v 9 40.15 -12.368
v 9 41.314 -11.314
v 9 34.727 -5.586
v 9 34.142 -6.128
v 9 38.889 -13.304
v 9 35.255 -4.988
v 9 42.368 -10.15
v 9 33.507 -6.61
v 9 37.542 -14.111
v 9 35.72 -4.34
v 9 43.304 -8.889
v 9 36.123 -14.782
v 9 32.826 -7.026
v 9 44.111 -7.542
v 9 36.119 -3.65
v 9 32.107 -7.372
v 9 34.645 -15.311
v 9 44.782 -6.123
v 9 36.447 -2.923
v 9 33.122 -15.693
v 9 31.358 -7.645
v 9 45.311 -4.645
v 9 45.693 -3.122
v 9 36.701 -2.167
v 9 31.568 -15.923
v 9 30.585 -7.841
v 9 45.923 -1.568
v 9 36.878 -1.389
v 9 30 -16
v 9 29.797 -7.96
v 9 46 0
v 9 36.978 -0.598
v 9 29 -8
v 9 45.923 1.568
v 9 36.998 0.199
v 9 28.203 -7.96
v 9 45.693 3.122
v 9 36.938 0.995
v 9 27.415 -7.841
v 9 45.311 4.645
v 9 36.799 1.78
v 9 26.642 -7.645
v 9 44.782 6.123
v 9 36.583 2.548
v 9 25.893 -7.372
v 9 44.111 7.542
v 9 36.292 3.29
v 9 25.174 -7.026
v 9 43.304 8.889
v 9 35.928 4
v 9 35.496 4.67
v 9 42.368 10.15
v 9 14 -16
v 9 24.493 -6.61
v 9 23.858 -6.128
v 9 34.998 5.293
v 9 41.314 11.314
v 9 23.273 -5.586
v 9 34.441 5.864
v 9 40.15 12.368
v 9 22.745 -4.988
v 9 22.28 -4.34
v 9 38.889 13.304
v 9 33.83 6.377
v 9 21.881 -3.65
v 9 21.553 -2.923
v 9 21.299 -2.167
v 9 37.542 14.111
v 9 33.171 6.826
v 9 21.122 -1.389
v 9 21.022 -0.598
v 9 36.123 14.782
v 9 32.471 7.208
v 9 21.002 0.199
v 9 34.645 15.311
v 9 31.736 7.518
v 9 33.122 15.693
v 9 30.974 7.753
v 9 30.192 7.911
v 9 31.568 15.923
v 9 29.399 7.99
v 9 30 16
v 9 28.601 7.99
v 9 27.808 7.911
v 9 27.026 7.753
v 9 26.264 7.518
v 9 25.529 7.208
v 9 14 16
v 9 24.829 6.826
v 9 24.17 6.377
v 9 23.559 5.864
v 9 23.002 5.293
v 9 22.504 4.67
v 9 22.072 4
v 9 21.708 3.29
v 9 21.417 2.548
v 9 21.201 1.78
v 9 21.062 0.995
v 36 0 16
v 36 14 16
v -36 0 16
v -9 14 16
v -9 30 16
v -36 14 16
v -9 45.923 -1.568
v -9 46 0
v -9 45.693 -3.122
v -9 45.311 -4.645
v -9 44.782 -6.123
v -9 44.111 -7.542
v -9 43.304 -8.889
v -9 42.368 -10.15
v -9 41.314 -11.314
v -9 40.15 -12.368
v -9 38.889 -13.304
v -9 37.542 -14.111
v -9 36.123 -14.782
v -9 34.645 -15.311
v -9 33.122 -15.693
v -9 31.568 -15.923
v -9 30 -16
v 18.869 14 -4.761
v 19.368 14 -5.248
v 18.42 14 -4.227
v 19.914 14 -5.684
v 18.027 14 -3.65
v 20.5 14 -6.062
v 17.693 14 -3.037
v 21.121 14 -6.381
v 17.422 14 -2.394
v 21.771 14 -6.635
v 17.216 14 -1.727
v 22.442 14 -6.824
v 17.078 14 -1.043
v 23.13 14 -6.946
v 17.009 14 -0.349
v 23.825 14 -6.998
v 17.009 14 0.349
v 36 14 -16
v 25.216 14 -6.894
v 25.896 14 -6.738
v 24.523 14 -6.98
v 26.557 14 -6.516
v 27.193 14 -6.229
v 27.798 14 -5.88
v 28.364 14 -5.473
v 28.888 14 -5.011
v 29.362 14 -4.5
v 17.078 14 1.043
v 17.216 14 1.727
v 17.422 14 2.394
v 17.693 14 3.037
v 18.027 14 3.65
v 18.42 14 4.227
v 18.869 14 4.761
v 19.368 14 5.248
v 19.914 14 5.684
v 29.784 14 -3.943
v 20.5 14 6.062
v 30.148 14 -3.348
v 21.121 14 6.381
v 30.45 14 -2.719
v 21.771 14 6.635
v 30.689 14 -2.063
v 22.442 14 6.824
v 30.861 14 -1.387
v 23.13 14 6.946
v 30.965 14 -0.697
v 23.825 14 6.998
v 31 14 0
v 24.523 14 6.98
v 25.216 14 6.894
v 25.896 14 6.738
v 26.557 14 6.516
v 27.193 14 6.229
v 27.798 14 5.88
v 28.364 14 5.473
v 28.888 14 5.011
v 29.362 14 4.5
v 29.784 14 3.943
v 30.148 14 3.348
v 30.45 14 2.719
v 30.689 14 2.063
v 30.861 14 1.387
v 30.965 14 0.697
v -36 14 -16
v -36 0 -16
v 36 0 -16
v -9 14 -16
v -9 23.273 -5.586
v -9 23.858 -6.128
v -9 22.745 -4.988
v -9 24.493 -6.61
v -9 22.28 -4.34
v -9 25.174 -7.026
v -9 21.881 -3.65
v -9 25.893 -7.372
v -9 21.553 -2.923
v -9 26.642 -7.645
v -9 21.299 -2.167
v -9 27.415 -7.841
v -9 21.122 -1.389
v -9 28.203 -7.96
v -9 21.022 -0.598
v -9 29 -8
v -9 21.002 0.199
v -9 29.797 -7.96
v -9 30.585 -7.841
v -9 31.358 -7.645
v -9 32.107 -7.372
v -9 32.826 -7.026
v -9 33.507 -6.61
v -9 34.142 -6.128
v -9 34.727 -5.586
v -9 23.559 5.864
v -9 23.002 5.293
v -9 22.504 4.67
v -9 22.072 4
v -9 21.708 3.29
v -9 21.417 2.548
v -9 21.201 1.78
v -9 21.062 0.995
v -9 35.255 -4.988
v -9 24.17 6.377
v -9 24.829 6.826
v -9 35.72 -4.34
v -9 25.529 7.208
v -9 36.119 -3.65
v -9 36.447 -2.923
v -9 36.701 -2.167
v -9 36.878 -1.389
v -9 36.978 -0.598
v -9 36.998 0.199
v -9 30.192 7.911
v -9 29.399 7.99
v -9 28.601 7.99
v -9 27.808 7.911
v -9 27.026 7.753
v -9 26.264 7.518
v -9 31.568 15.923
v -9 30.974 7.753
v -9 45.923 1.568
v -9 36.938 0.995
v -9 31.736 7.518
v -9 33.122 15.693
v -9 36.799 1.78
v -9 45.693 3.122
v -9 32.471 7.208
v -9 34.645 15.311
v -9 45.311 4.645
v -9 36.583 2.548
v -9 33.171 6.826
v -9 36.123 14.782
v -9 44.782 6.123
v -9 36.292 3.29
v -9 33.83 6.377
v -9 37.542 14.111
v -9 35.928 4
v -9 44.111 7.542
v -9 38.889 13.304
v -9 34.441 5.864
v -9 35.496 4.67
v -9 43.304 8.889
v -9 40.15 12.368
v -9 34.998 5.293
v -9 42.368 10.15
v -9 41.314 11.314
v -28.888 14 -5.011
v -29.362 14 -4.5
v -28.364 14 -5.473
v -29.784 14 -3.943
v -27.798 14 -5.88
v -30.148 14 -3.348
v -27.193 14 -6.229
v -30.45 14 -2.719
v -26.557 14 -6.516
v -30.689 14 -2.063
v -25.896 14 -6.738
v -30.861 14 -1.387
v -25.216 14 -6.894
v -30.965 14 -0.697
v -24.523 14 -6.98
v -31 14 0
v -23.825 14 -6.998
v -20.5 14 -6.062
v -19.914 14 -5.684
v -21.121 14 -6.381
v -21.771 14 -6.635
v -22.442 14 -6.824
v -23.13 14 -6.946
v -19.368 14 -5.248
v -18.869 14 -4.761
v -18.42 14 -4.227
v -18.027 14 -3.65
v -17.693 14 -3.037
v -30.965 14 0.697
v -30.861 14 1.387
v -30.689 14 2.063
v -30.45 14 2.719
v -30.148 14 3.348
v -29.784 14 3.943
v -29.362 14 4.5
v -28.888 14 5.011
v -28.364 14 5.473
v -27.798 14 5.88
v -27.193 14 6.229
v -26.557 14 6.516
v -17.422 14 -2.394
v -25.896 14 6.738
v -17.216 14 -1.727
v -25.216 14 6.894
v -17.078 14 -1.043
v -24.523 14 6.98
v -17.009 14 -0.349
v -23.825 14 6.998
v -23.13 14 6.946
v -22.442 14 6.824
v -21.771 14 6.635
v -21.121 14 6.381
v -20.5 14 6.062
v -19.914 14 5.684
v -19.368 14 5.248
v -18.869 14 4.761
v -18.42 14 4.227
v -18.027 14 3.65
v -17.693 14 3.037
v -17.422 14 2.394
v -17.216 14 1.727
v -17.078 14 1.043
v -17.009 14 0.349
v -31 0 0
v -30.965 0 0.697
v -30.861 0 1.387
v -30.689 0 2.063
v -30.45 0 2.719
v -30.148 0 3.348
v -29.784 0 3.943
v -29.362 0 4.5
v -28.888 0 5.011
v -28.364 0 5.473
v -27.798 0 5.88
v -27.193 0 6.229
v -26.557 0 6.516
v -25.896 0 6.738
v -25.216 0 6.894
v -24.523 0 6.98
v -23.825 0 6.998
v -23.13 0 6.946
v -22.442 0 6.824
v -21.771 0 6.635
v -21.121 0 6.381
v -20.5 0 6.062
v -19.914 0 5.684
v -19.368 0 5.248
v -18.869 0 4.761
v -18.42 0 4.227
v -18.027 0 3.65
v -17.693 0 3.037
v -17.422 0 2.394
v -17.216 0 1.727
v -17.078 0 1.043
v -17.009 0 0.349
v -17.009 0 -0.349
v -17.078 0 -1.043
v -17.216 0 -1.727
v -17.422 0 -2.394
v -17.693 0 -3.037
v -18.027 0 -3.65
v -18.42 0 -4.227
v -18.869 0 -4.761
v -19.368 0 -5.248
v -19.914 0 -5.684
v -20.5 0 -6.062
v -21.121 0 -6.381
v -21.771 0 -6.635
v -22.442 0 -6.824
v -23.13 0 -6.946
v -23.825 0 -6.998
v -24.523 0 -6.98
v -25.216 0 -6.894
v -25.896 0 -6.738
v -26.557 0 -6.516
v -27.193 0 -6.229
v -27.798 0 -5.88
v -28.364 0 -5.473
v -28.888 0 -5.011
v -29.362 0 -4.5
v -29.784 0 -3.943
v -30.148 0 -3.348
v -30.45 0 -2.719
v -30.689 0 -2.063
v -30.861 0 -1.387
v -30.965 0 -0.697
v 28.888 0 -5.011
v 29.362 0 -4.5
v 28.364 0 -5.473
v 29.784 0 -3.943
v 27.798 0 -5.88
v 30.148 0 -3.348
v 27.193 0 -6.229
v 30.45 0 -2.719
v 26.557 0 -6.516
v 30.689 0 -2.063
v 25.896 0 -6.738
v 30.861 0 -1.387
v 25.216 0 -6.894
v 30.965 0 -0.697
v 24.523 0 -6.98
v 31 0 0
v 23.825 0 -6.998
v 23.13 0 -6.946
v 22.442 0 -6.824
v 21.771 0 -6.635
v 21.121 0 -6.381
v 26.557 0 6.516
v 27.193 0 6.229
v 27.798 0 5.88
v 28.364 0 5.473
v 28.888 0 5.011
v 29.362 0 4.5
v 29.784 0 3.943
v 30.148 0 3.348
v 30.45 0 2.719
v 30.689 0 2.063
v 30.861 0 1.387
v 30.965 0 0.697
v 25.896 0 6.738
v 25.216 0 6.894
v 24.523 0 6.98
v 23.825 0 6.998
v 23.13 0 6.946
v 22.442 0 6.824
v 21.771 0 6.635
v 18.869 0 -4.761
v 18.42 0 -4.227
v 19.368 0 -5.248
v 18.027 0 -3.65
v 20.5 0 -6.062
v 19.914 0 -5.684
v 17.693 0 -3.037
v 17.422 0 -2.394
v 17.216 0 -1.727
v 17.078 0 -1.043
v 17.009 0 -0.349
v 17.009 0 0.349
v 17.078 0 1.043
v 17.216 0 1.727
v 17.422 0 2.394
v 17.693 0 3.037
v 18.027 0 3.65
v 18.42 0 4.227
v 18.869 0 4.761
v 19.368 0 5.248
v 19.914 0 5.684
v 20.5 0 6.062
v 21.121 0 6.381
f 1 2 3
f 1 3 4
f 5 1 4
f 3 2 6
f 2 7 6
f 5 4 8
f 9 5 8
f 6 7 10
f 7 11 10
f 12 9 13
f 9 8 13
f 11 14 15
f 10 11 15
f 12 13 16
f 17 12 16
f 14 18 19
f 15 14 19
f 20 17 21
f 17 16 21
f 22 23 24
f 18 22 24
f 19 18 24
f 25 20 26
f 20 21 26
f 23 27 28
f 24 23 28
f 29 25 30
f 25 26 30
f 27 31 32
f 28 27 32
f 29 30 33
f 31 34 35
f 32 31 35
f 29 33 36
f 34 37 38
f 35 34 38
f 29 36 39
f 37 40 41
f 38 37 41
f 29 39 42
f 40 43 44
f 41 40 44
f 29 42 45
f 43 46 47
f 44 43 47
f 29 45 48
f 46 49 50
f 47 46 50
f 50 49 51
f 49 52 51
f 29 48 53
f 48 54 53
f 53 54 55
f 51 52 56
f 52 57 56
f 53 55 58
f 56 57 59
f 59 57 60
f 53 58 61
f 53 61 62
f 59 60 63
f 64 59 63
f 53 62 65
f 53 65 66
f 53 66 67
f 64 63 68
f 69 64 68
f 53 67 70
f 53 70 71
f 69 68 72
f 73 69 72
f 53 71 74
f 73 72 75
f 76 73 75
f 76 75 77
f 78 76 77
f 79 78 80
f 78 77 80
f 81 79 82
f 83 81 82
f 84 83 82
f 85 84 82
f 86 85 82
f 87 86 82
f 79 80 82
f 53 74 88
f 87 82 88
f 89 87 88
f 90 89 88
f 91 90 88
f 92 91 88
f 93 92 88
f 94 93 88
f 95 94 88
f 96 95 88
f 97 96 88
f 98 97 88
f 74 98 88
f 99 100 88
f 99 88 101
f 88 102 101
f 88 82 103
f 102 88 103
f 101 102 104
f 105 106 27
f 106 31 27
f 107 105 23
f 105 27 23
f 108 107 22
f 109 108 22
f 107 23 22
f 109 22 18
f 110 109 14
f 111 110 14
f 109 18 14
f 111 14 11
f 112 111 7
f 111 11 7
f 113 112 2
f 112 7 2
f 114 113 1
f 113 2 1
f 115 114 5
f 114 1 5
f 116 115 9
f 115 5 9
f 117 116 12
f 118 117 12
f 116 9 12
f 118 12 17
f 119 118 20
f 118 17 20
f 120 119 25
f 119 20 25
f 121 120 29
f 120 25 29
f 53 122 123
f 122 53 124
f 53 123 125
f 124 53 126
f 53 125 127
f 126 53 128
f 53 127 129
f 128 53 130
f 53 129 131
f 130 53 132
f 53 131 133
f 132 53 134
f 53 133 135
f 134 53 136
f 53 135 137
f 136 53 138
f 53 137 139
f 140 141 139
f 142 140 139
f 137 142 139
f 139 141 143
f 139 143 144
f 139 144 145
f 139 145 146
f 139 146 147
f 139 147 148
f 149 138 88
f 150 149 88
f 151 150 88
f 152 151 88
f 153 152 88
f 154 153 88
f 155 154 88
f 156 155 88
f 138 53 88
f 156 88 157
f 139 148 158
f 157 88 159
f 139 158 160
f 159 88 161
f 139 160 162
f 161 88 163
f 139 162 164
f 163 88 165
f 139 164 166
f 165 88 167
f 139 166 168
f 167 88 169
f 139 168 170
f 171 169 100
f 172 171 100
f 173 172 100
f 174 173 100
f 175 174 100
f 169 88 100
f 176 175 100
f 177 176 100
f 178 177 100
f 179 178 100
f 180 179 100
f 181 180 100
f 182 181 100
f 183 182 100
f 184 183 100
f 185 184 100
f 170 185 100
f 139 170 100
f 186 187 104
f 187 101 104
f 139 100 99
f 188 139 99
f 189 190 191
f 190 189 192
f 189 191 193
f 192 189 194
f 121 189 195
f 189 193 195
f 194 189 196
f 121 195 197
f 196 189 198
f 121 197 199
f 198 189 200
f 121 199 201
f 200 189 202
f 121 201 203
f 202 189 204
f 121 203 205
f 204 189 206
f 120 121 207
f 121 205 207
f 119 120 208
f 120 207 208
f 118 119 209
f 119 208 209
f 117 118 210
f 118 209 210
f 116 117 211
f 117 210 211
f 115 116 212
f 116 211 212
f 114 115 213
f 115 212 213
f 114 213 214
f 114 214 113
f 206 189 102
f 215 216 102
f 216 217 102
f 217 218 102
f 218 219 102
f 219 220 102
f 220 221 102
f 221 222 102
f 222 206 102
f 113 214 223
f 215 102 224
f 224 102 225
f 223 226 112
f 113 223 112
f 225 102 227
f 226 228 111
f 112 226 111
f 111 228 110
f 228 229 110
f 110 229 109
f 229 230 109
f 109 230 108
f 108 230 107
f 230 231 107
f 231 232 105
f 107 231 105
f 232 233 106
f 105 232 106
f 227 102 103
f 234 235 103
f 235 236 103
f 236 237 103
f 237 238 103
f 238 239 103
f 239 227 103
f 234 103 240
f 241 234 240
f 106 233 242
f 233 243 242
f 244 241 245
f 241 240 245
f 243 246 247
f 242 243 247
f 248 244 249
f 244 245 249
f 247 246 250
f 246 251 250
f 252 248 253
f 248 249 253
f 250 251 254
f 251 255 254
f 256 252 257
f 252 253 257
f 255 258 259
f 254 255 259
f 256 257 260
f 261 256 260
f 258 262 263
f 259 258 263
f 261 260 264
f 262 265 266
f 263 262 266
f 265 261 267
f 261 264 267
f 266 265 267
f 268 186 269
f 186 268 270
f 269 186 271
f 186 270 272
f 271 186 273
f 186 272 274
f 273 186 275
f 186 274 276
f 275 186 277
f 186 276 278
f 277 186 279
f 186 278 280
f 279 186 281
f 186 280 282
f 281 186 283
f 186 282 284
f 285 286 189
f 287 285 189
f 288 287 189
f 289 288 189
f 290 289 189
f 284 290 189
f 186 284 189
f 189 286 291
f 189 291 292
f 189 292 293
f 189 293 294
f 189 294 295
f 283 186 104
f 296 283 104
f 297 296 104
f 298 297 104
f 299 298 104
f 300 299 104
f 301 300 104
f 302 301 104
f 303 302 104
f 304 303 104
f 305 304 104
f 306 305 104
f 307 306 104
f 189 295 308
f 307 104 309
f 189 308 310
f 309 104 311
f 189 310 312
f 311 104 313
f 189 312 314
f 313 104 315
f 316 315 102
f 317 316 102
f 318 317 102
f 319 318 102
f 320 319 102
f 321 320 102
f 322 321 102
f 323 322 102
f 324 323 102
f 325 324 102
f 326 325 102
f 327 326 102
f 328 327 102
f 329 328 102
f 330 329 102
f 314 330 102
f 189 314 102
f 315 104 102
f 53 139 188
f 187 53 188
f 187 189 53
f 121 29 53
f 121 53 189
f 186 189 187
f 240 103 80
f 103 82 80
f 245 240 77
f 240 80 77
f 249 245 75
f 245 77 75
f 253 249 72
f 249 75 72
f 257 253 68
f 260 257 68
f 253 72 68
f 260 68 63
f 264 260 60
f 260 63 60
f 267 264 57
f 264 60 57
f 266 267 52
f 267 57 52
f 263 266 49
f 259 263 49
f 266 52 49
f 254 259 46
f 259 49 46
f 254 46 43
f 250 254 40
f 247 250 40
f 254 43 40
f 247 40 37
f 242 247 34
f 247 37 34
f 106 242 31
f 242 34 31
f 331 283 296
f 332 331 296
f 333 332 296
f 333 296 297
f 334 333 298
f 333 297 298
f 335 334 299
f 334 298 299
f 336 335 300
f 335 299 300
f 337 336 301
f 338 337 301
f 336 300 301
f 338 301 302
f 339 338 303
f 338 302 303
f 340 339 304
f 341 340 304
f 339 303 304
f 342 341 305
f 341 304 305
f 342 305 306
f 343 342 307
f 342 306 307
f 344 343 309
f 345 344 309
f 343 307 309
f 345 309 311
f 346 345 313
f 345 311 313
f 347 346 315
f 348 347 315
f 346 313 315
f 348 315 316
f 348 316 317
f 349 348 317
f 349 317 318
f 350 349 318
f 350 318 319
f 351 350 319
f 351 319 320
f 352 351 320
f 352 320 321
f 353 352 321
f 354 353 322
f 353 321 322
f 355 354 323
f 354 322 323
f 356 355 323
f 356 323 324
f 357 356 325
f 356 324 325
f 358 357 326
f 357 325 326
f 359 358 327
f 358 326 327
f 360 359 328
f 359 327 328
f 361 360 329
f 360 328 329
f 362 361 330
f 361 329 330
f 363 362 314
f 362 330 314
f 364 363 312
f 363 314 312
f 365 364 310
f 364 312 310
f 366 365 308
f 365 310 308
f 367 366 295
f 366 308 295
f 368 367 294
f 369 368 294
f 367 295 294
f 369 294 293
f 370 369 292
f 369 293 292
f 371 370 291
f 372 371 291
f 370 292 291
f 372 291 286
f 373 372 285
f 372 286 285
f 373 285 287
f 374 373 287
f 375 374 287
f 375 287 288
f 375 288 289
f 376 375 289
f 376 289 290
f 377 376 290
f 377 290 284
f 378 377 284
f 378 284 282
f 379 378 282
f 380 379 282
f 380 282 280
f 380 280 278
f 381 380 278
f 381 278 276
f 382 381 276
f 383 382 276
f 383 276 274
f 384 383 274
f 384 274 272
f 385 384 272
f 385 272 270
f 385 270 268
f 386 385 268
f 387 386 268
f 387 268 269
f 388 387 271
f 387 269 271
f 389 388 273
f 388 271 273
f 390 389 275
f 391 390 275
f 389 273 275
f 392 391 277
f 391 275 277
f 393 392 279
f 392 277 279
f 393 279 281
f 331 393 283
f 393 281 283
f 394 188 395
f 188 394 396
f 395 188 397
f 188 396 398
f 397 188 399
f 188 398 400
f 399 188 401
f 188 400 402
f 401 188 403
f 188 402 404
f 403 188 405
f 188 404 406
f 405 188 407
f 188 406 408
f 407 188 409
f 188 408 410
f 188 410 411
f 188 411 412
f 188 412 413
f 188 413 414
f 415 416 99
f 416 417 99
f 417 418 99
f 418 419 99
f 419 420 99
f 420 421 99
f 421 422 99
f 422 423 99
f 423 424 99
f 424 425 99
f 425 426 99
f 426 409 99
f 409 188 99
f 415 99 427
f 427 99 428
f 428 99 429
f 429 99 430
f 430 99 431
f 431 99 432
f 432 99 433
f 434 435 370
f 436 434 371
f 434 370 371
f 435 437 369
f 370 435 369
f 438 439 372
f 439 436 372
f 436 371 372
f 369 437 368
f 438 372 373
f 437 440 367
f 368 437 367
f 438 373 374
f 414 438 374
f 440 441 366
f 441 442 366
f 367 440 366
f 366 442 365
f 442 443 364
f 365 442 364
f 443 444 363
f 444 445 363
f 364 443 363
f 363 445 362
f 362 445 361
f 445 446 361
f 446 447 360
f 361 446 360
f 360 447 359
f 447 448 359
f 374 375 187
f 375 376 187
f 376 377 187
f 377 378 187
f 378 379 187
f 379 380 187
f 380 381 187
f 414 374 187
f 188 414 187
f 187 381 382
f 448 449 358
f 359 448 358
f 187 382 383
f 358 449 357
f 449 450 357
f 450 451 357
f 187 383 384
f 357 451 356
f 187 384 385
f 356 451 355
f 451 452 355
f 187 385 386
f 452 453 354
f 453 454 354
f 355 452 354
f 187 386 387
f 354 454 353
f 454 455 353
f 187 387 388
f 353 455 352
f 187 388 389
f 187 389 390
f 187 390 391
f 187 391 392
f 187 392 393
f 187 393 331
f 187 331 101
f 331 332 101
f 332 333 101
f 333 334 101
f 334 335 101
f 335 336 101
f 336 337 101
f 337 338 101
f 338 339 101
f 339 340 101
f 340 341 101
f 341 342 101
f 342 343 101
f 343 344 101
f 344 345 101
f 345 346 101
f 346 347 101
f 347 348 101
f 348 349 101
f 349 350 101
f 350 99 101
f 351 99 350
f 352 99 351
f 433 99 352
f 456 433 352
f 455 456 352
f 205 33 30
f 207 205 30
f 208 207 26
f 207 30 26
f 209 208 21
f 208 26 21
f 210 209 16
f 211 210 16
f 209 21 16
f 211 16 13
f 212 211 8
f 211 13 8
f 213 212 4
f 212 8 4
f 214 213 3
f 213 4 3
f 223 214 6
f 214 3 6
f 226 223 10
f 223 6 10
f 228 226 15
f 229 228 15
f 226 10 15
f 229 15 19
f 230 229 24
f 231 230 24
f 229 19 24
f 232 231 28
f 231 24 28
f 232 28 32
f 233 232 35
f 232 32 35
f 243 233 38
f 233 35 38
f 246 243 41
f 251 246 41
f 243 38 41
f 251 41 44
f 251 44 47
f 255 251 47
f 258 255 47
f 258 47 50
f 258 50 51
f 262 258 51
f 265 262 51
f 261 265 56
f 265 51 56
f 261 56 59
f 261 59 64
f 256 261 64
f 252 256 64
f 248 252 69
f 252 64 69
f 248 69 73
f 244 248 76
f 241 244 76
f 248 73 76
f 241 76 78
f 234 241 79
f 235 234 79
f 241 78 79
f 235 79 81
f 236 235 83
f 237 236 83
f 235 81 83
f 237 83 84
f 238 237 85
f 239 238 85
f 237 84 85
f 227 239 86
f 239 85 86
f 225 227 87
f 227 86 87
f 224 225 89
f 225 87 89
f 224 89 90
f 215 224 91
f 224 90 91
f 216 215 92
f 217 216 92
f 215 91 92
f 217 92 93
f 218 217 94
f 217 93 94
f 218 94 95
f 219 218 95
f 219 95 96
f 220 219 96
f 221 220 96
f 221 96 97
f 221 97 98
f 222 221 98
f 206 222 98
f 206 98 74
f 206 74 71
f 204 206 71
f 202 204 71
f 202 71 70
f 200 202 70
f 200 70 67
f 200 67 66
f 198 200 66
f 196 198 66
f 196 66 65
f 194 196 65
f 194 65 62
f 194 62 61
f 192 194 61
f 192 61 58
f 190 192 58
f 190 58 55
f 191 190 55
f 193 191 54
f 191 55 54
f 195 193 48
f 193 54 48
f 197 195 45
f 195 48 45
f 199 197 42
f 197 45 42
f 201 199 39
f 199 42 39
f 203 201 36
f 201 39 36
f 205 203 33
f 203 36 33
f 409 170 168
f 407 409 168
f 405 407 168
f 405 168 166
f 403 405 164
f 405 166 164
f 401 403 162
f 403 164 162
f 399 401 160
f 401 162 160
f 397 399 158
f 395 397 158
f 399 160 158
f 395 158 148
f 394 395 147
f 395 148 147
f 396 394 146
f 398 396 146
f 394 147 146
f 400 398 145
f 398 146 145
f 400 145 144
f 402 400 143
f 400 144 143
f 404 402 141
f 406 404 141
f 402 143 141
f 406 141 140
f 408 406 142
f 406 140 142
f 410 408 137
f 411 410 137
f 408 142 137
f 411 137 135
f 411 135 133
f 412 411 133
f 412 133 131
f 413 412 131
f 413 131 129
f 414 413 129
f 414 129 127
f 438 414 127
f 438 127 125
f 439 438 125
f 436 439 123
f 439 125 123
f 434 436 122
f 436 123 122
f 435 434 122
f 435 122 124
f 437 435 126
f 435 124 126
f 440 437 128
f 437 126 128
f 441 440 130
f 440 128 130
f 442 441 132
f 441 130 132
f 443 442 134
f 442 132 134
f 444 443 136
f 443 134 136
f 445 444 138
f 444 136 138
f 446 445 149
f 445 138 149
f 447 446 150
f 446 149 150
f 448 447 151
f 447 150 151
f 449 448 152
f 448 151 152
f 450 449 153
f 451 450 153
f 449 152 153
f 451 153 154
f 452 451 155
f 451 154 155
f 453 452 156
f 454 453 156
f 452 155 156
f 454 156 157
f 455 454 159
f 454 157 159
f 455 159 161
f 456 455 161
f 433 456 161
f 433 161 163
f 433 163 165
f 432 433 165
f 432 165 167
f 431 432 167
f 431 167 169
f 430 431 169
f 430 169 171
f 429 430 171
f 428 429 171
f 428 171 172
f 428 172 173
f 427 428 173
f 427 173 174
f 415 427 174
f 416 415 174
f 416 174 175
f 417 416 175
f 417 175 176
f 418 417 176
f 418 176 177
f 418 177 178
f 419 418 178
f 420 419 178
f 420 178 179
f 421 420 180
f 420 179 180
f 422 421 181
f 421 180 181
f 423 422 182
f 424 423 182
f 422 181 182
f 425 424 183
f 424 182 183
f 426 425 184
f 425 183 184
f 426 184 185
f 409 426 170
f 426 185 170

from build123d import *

# Parameters (mm, degrees)
BOSS_EXTRUDE1_DEPTH = 16
FILLET1_R           = 16
SKETCH6_R           = 7
CUT_EXTRUDE3_DEPTH  = 14
SKETCH3_R           = 8
CUT_EXTRUDE2_DEPTH  = 18


with BuildPart() as part:
    # Sketch1 → Boss-Extrude1 (new, symmetric)
    with BuildSketch(Plane.XY):
        Polygon((36, 0), (-36, 0), (-36, 14), (-9, 14), (-9, 46), (9, 46), (9, 14), (36, 14), align=None)
    extrude(amount=BOSS_EXTRUDE1_DEPTH, both=True)

    # Fillet1
    fillet1_edges = [part.edges().sort_by_distance(p)[0] for p in [
        (0, 46, -16),
        (0, 46, 16),
    ]]
    fillet(fillet1_edges, radius=FILLET1_R - 0.0001)  # a hair under: the kernel refuses the full size

    # Sketch6 → Cut-Extrude3 (cut)
    with BuildSketch(Plane(origin=(0, 14, 0), x_dir=(1, 0, 0), z_dir=(0, 1, 0))):
        with Locations(Location((-24, 0, 0), (0, 0, 180))):
            Circle(SKETCH6_R)
        with Locations((24, 0)):
            Circle(SKETCH6_R)
    extrude(amount=-CUT_EXTRUDE3_DEPTH, mode=Mode.SUBTRACT)

    # Sketch3 → Cut-Extrude2 (cut)
    with BuildSketch(Plane(origin=(9, 0, 0), x_dir=(0, 0, -1), z_dir=(1, 0, 0))):
        with Locations((0, 29)):
            Circle(SKETCH3_R)
    extrude(amount=-CUT_EXTRUDE2_DEPTH, mode=Mode.SUBTRACT)


solid = part.part
